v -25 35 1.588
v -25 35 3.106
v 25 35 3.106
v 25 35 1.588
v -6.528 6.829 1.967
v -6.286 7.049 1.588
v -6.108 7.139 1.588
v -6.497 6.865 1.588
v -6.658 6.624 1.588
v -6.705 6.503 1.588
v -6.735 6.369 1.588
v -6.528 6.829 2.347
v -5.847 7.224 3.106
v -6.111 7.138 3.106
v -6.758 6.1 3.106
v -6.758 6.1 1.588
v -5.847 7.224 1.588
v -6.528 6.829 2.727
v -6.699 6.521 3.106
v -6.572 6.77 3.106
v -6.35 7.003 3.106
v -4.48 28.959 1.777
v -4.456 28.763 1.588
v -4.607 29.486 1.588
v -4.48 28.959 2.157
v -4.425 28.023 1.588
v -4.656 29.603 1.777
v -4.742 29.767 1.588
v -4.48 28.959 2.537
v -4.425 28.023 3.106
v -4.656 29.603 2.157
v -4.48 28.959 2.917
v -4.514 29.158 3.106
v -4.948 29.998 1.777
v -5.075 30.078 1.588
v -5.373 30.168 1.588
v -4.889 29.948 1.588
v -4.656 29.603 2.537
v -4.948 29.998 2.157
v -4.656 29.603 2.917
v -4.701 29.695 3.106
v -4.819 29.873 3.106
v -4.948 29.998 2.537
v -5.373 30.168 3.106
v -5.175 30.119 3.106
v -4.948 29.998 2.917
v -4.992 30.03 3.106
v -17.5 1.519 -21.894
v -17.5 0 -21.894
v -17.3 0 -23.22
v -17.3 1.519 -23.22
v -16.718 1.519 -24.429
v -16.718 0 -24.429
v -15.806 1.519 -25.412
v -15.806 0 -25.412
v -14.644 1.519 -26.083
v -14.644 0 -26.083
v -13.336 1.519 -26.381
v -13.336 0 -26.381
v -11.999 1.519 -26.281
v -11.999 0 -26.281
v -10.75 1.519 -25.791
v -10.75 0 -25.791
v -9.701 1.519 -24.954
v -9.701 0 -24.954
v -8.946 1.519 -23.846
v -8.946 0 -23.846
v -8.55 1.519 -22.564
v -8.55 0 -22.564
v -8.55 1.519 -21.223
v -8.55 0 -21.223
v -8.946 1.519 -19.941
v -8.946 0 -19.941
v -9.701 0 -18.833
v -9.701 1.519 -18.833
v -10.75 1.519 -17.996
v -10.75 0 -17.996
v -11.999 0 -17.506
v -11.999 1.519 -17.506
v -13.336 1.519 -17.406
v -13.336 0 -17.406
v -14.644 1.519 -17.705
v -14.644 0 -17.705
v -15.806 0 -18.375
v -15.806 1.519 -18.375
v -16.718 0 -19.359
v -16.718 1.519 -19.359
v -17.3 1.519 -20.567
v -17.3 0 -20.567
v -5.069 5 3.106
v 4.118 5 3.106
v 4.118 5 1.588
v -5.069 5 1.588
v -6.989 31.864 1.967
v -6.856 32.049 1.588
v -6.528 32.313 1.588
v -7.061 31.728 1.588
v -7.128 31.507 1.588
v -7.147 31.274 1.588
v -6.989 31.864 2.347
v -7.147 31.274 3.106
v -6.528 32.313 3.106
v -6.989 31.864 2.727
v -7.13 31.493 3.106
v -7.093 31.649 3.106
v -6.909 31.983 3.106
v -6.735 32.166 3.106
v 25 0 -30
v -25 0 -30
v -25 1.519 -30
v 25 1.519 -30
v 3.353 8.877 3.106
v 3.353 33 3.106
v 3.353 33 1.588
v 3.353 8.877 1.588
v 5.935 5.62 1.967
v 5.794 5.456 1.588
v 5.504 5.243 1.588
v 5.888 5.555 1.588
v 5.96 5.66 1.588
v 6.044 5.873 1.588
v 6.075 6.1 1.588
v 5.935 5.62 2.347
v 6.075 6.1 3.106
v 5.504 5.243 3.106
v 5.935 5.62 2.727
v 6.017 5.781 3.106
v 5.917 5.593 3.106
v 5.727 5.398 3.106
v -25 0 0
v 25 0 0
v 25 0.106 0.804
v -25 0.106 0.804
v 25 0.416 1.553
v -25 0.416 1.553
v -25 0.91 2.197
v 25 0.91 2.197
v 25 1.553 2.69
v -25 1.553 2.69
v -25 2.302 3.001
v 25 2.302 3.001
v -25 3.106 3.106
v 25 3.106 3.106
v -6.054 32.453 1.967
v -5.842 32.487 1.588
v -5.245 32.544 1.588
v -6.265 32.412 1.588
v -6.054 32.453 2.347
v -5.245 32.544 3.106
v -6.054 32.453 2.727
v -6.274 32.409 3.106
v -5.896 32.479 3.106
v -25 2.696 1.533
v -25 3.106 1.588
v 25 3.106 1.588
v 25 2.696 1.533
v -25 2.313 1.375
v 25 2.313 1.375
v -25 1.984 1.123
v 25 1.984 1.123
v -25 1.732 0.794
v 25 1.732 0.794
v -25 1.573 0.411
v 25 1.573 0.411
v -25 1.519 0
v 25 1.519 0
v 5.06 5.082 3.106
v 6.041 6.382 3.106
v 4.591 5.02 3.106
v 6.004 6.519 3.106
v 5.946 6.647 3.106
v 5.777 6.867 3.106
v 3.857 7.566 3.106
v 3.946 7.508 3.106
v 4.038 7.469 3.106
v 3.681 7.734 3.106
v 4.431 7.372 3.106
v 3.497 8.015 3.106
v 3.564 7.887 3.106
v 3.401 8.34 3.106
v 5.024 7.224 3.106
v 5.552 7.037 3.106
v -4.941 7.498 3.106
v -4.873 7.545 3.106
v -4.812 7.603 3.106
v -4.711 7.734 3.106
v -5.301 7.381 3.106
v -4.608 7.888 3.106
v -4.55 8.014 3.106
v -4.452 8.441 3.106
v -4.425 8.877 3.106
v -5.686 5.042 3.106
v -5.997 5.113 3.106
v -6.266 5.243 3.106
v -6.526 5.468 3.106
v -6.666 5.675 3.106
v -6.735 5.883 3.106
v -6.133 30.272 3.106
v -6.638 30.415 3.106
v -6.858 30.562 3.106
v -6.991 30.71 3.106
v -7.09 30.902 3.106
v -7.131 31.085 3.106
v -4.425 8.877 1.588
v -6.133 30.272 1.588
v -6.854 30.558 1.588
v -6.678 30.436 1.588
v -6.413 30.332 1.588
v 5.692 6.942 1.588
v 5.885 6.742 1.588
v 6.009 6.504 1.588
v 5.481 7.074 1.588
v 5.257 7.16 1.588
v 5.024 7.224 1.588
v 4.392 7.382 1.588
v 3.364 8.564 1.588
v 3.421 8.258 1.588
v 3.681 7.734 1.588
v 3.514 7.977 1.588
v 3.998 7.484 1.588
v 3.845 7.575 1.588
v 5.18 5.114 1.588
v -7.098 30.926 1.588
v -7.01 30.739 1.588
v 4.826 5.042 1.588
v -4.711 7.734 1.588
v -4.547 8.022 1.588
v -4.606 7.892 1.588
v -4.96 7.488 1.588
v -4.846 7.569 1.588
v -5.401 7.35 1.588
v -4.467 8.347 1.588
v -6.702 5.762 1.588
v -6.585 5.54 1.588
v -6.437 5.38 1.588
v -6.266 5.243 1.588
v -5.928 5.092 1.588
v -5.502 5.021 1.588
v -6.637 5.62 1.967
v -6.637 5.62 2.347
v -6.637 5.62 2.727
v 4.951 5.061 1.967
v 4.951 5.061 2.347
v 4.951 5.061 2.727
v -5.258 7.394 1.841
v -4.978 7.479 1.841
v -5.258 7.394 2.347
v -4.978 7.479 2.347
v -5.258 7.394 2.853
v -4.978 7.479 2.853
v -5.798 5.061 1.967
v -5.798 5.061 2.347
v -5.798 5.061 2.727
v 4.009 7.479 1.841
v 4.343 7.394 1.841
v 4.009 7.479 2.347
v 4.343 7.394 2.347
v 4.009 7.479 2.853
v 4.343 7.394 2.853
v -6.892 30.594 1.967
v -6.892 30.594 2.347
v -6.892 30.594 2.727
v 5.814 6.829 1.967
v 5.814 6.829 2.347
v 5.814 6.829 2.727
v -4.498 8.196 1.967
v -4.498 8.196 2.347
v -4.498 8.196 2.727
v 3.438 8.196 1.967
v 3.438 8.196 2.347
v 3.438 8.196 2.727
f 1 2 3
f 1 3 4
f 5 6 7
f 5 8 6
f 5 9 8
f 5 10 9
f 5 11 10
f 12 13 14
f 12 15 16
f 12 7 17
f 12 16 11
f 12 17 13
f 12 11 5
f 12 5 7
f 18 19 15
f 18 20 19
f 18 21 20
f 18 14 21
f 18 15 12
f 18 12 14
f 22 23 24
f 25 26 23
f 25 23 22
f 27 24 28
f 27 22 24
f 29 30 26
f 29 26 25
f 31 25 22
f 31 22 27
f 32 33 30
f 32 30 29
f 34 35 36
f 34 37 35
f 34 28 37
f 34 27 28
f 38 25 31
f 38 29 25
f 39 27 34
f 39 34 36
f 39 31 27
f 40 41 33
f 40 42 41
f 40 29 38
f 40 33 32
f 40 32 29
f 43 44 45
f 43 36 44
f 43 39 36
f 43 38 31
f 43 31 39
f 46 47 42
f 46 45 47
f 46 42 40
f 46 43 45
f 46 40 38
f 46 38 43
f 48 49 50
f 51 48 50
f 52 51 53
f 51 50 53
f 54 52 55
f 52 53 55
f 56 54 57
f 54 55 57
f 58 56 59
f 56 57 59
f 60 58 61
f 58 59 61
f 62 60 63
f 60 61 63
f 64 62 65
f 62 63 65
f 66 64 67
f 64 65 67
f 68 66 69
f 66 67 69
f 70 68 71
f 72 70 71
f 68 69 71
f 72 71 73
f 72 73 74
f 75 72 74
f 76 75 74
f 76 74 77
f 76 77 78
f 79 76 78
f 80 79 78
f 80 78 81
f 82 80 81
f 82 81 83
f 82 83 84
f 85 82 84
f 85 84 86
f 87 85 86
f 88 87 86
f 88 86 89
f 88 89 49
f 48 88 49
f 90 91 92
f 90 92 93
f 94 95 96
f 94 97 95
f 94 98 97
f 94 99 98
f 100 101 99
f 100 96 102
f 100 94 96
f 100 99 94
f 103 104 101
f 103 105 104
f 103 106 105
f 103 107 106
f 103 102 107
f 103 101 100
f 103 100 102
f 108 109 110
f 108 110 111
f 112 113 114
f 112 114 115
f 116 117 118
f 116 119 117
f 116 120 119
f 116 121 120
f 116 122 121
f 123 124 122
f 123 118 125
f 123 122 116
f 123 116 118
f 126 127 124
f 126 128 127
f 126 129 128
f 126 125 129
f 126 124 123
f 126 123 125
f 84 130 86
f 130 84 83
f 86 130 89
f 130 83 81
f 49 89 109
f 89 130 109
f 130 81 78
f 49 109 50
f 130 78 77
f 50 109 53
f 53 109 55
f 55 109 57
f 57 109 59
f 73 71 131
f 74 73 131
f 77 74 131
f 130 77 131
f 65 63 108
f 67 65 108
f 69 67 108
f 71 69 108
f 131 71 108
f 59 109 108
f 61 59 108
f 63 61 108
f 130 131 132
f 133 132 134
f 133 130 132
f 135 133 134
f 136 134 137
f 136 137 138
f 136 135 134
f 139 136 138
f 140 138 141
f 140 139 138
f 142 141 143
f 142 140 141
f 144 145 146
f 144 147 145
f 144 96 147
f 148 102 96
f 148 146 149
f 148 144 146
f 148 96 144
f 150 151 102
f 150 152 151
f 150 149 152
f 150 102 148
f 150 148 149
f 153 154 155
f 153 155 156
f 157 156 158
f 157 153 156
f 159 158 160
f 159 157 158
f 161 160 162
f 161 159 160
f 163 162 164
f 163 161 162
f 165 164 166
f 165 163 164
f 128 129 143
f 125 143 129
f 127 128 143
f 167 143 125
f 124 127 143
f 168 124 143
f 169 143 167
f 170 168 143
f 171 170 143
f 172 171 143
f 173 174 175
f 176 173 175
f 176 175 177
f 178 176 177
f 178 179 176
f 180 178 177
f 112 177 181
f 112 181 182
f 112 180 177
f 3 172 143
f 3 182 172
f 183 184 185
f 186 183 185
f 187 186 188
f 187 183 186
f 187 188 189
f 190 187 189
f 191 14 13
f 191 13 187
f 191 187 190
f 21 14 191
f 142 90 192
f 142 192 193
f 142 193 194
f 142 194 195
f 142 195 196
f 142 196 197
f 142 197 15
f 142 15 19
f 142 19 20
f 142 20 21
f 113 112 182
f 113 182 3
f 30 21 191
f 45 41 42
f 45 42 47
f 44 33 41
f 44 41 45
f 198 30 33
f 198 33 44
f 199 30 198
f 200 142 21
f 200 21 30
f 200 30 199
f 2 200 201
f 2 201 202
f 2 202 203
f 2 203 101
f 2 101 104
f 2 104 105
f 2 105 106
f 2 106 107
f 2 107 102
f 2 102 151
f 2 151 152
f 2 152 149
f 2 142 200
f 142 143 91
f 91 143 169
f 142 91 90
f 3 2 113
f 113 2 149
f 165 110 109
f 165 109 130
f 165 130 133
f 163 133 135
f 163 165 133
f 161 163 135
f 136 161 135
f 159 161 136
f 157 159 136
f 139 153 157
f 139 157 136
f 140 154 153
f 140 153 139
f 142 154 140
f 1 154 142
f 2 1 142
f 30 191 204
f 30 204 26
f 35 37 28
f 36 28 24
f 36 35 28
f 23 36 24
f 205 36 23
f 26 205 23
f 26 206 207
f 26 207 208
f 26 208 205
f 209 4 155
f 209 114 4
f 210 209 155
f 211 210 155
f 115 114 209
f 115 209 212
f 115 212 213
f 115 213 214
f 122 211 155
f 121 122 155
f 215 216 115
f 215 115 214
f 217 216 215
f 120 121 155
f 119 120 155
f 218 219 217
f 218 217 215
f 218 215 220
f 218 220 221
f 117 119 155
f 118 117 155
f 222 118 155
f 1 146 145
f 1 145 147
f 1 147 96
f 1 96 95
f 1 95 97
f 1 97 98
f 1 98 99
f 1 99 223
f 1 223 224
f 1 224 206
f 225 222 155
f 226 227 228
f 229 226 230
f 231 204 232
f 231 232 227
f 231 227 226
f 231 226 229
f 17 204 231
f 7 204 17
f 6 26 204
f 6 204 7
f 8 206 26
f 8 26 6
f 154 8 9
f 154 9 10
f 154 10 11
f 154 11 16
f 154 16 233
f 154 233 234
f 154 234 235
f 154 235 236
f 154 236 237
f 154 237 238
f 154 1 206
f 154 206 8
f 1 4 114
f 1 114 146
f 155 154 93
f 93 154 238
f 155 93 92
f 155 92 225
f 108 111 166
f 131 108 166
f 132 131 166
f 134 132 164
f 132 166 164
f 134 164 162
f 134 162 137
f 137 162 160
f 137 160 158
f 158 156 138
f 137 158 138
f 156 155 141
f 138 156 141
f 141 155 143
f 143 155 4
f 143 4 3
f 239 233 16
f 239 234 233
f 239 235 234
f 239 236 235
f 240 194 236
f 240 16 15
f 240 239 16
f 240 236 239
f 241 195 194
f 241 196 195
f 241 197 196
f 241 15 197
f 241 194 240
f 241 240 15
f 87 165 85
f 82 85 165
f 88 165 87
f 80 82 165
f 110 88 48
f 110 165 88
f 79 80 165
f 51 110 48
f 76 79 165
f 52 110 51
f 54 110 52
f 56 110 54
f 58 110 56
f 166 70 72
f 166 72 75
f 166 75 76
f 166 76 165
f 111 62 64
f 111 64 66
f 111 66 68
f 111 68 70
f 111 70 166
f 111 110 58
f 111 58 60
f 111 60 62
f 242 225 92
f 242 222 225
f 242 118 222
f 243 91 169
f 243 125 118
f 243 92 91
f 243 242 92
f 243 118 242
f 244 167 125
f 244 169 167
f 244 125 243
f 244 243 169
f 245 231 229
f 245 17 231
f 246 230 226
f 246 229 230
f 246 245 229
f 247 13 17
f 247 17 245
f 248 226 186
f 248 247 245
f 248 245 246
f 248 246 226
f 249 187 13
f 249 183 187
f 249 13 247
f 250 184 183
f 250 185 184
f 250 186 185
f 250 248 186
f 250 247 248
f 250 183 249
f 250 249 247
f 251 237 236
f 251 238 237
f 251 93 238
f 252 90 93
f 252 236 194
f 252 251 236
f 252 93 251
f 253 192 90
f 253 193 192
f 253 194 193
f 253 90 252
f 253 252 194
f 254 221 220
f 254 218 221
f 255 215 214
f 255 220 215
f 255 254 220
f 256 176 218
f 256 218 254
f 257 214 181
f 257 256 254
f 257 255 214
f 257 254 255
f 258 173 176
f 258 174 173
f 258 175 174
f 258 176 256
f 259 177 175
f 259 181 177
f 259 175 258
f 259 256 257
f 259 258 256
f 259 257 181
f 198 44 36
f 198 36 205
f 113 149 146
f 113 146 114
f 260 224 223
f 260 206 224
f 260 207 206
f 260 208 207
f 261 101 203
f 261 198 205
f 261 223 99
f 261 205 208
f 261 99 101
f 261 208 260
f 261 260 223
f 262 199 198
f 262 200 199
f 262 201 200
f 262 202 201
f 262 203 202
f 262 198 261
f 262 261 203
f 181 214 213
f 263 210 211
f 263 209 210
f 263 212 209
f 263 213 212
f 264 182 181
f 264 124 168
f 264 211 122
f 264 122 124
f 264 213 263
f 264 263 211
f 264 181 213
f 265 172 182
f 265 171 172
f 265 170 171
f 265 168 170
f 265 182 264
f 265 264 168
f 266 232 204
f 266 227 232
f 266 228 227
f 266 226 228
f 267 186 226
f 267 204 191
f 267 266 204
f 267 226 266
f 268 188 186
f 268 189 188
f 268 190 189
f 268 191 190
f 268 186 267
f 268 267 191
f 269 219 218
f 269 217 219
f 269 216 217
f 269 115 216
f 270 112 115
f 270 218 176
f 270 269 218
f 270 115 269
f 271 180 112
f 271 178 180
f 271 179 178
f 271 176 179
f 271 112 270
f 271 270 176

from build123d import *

# Parameters (mm, degrees)
SKETCH1_W            = 50
SKETCH1_H            = 30
BASE_FLANGE1_DEPTH   = 1.51892
EDGE_FLANGE1_DEPTH   = 50
M8_CLEARANCE_HOLE1_D = 9
CUT_EXTRUDE1_DEPTH   = 55.277389816


# Sheet-metal steps are written as plain solids
with BuildPart() as part:
    # Sketch1 → Base-Flange1 (new body)
    with BuildSketch(Plane(origin=(0, 0, 0), x_dir=(1, 0, 0), z_dir=(0, 1, 0))):
        with Locations((0, 15)):
            Rectangle(SKETCH1_W, SKETCH1_H)
    extrude(amount=BASE_FLANGE1_DEPTH)

    # Edge-Flange1 section (across the edge) → Edge-Flange1 (add)
    with BuildSketch(Plane(origin=(-25, 1.51892, 1.5875), x_dir=(0, 0, -1), z_dir=(1, 0, 0))):
        with BuildLine():
            Line((-1.51892, 1.5875), (-1.51892, 33.48108))
            Line((-1.51892, 33.48108), (0, 33.48108))
            Line((0, 33.48108), (0, 1.5875))
            ThreePointArc((0, 1.5875), (0.464967985, 0.464967985), (1.5875, 0))
            Line((1.5875, 0), (1.5875, -1.51892))
            ThreePointArc((1.5875, -1.51892), (-0.609070647, -0.609070647), (-1.51892, 1.5875))
        make_face()
    extrude(amount=EDGE_FLANGE1_DEPTH)

    # M8 Clearance Hole1 (through all)
    with Locations(Plane(origin=(0, 1.51892, 0), x_dir=(1, 0, 0), z_dir=(0, 1, 0))):
        with Locations((-13, 21.89358)):
            Hole(M8_CLEARANCE_HOLE1_D / 2)

    # Sketch11 → Cut-Extrude1 (cut, through all)
    with BuildSketch(Plane.XY.offset(3.10642)):
        with BuildLine():
            Line((3.352683653, 33), (3.352683653, 8.876736111))
            add(Edge.make_bspline(
                [(3.352683653, 8.876736111), (3.353743072, 8.75248746), (3.355707508, 8.522098259), (3.431182496, 8.208449128), (3.514980812, 7.935424237), (3.62773347, 7.798723212), (3.680808653, 7.734375)],
                knots=[0, 0, 0, 0, 1.221894812, 2.265709648, 3.183630964, 4, 4, 4, 4], degree=3))
            add(Edge.make_bspline(
                [(3.680808653, 7.734375), (3.734677776, 7.676504164), (3.830117167, 7.573974975), (3.989367782, 7.479439012), (4.159797664, 7.433882679), (4.373058128, 7.390651398), (4.667575389, 7.304305676), (4.895720619, 7.252831146), (5.023690598, 7.223958333)],
                knots=[0, 0, 0, 0, 0.967781164, 1.714608312, 2.234126727, 3.127399629, 4.388716669, 6, 6, 6, 6], degree=3))
            add(Edge.make_bspline(
                [(5.023690598, 7.223958333), (5.181883466, 7.183631094), (5.472950316, 7.109431018), (5.825003123, 6.855284919), (6.042399674, 6.503977916), (6.06374242, 6.238622284), (6.074905875, 6.099826389)],
                knots=[0, 0, 0, 0, 1.155259645, 2.125619132, 3.019593567, 4, 4, 4, 4], degree=3))
            add(Edge.make_bspline(
                [(6.074905875, 6.099826389), (6.06732471, 6.015842007), (6.052127137, 5.847482842), (5.944064224, 5.60615586), (5.75097894, 5.402699673), (5.589337522, 5.298332742), (5.50372532, 5.243055556)],
                knots=[0, 0, 0, 0, 0.931770353, 1.867872026, 2.870733925, 4, 4, 4, 4], degree=3))
            add(Edge.make_bspline(
                [(5.50372532, 5.243055556), (5.423622762, 5.206171118), (5.246520526, 5.124621709), (4.930300382, 5.048945746), (4.546600649, 5.012201245), (4.268276747, 5.004272313), (4.118308653, 5)],
                knots=[0, 0, 0, 0, 0.744408225, 1.645844579, 2.731520362, 4, 4, 4, 4], degree=3))
            Line((4.118308653, 5), (3.37091282, 5))
            Line((3.37091282, 5), (-4.443323291, 5))
            Line((-4.443323291, 5), (-5.069191347, 5))
            add(Edge.make_bspline(
                [(-5.069191347, 5), (-5.200959456, 5.004230902), (-5.445003537, 5.012066838), (-5.780351524, 5.049107042), (-6.053589539, 5.123405658), (-6.200525, 5.206080373), (-6.266239958, 5.243055556)],
                knots=[0, 0, 0, 0, 1.278909849, 2.36863365, 3.270392795, 4, 4, 4, 4], degree=3))
            add(Edge.make_bspline(
                [(-6.266239958, 5.243055556), (-6.339681587, 5.298913512), (-6.481004414, 5.406400292), (-6.646771526, 5.611036077), (-6.740904198, 5.849325914), (-6.752565064, 6.016021642), (-6.758427458, 6.099826389)],
                knots=[0, 0, 0, 0, 1.071870055, 2.062586414, 3.025983099, 4, 4, 4, 4], degree=3))
            add(Edge.make_bspline(
                [(-6.758427458, 6.099826389), (-6.751201394, 6.238381888), (-6.737517447, 6.500763459), (-6.542576602, 6.842832855), (-6.244911058, 7.108230032), (-5.985928279, 7.183546642), (-5.846969125, 7.223958333)],
                knots=[0, 0, 0, 0, 1.041821617, 1.972890251, 2.912339053, 4, 4, 4, 4], degree=3))
            add(Edge.make_bspline(
                [(-5.846969125, 7.223958333), (-5.735122036, 7.252770415), (-5.537017037, 7.303802744), (-5.285346725, 7.389215809), (-5.104551332, 7.434528827), (-4.959644822, 7.480235759), (-4.824408418, 7.574602156), (-4.751821285, 7.676581079), (-4.710684402, 7.734375)],
                knots=[0, 0, 0, 0, 1.624637859, 2.877579422, 3.734891967, 4.248647568, 5.007466236, 6, 6, 6, 6], degree=3))
            add(Edge.make_bspline(
                [(-4.710684402, 7.734375), (-4.664199883, 7.799255117), (-4.563973926, 7.939144093), (-4.49111496, 8.20905769), (-4.431859524, 8.523582896), (-4.42746965, 8.752733909), (-4.425094125, 8.876736111)],
                knots=[0, 0, 0, 0, 0.793417505, 1.710699182, 2.761173524, 4, 4, 4, 4], degree=3))
            Line((-4.425094125, 8.876736111), (-4.425094125, 28.0234375))
            add(Edge.make_bspline(
                [(-4.425094125, 28.0234375), (-4.426531902, 28.191669086), (-4.429205189, 28.504465382), (-4.470592994, 28.937557572), (-4.538640115, 29.30004587), (-4.643358024, 29.592207067), (-4.770170391, 29.828354389), (-4.936878879, 30.004608948), (-5.143251784, 30.120886097), (-5.294711667, 30.152209661), (-5.373010791, 30.168402778)],
                knots=[0, 0, 0, 0, 1.573891919, 2.926368201, 4.067733782, 5.015207088, 5.82171764, 6.559095732, 7.255106106, 8, 8, 8, 8], degree=3))
            Line((-5.373010791, 30.168402778), (-6.132559402, 30.271701389))
            add(Edge.make_bspline(
                [(-6.132559402, 30.271701389), (-6.283854904, 30.300098434), (-6.559763459, 30.351884427), (-6.904178309, 30.569151507), (-7.122046768, 30.892299153), (-7.138654843, 31.143367481), (-7.147316347, 31.274305556)],
                knots=[0, 0, 0, 0, 1.161059911, 2.117355492, 3.018156337, 4, 4, 4, 4], degree=3))
            add(Edge.make_bspline(
                [(-7.147316347, 31.274305556), (-7.142422565, 31.381346659), (-7.132924891, 31.589088155), (-6.995811409, 31.871248407), (-6.805451884, 32.128706889), (-6.623451964, 32.249631783), (-6.52752468, 32.313368056)],
                knots=[0, 0, 0, 0, 1.003758752, 1.948058634, 2.918476655, 4, 4, 4, 4], degree=3))
            add(Edge.make_bspline(
                [(-6.52752468, 32.313368056), (-6.463477626, 32.342119574), (-6.312140707, 32.410056597), (-6.025881505, 32.457814765), (-5.664653043, 32.51745606), (-5.393638242, 32.534790019), (-5.245406625, 32.544270833)],
                knots=[0, 0, 0, 0, 0.641016437, 1.514659076, 2.640642126, 4, 4, 4, 4], degree=3))
            Line((-5.245406625, 32.544270833), (3.352683653, 33))
        make_face()
    extrude(amount=-CUT_EXTRUDE1_DEPTH, mode=Mode.SUBTRACT)


solid = part.part
